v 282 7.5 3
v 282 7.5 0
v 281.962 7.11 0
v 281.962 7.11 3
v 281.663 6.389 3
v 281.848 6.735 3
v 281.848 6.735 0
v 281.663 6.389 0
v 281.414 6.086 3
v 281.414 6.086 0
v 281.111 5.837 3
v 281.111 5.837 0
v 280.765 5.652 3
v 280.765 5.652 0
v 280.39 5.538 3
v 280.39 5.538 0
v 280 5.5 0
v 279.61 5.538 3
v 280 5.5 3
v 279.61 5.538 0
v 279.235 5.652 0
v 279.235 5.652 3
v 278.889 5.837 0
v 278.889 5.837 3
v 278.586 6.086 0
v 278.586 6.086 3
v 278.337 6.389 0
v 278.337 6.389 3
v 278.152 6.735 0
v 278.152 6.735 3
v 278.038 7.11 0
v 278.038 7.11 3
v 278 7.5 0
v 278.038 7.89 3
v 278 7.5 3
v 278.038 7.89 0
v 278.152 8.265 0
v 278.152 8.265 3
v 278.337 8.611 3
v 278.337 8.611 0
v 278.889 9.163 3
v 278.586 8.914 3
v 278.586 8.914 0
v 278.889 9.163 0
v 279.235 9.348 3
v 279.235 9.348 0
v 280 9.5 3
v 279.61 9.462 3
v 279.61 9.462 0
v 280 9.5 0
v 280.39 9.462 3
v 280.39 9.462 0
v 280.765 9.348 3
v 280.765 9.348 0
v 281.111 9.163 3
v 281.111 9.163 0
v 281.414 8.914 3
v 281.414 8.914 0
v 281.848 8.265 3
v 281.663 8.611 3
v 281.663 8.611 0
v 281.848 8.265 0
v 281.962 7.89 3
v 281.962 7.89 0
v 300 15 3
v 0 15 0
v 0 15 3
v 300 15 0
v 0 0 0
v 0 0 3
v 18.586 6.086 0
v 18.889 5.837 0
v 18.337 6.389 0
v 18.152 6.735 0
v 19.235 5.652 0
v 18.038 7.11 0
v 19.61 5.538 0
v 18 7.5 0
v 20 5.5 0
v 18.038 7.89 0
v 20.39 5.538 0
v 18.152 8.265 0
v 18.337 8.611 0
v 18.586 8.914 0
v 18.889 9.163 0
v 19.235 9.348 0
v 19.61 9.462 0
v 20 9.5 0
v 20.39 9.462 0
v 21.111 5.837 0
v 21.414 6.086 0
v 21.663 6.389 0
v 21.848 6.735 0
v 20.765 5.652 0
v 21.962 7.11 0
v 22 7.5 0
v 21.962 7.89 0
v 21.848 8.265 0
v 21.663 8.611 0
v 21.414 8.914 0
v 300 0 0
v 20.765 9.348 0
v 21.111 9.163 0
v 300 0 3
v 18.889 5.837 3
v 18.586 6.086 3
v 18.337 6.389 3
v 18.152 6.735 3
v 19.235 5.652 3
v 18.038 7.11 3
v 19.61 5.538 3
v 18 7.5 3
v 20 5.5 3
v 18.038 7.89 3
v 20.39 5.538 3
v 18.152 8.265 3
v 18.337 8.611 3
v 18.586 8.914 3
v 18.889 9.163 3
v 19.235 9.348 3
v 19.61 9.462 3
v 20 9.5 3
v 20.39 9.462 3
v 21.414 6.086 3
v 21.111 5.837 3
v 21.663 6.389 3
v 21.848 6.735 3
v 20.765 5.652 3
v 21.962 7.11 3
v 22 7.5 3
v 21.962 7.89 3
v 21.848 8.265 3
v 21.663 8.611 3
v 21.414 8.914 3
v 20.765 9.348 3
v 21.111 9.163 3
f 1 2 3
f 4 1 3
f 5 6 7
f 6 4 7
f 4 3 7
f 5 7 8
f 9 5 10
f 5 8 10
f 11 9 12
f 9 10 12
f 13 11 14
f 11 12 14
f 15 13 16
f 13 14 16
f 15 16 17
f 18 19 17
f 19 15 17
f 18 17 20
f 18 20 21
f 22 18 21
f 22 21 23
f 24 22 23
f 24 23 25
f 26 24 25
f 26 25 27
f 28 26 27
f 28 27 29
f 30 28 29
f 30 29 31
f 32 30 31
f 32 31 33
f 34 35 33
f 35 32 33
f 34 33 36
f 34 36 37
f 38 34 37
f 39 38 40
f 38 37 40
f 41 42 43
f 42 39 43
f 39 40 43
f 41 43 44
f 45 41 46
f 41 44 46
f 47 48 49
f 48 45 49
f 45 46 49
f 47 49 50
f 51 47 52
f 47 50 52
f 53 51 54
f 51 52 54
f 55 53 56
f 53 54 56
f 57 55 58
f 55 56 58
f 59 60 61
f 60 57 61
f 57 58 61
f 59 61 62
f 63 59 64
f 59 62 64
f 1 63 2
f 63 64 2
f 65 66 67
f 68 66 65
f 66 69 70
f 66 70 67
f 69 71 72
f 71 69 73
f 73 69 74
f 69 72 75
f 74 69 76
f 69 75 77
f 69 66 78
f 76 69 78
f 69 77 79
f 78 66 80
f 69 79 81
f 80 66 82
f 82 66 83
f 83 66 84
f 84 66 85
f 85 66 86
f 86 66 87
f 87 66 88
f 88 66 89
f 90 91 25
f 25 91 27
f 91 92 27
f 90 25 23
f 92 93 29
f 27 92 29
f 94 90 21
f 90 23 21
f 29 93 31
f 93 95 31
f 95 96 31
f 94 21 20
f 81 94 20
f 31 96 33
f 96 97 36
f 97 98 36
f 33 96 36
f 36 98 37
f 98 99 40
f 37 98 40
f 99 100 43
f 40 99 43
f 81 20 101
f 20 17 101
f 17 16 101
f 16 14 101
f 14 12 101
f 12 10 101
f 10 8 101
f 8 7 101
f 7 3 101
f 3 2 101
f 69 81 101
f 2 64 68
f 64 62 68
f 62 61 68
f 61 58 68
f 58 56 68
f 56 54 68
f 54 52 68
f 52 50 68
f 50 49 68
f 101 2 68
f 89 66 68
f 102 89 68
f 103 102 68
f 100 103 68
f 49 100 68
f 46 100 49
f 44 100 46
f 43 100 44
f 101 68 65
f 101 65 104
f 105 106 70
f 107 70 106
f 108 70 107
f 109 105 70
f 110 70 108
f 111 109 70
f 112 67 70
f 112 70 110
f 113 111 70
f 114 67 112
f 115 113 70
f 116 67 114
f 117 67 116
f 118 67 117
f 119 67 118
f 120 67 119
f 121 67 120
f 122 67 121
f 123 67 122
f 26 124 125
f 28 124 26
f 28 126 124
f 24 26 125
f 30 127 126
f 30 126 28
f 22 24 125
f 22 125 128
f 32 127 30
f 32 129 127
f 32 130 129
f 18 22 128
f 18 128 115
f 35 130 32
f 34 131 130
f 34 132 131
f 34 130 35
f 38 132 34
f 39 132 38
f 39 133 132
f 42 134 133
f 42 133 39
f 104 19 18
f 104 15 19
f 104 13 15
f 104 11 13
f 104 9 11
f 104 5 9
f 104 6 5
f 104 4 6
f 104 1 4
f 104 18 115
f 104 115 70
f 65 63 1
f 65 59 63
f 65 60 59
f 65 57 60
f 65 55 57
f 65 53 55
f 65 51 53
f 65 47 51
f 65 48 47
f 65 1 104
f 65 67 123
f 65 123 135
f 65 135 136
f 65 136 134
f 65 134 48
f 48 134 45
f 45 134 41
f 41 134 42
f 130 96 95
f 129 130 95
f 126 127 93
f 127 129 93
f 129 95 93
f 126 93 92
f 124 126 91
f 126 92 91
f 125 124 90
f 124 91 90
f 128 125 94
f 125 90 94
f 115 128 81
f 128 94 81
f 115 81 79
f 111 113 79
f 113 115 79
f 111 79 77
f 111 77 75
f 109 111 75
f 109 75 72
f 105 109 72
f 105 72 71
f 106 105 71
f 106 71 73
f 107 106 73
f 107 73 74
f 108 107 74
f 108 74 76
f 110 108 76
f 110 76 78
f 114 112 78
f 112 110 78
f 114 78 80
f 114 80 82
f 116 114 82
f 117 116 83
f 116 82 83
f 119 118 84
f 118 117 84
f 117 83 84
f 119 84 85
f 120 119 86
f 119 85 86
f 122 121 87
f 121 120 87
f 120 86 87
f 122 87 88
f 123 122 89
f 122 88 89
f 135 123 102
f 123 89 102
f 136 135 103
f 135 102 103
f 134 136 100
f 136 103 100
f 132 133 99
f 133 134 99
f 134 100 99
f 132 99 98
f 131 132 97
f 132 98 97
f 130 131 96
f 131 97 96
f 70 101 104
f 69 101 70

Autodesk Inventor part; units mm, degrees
ref_plane "YZ Plane" through (0, 0, 0) normal (1, 0, 0) x (0, 1, 0)
ref_plane "XZ Plane" through (0, 0, 0) normal (0, 1, 0) x (-1, 0, 0)
ref_plane "XY Plane" through (0, 0, 0) normal (0, 0, 1) x (1, 0, 0)
sketch "草圖1" plane through (0, 0, 0) normal (0, 0, 1) x (1, 0, 0)
  line L0 (0, 15) -> (300, 15)
  line L1 (300, 15) -> (300, 0)
  line L2 (300, 0) -> (0, 0)
  line L3 (0, 0) -> (0, 15)
  circle A0 centre (20, 7.5) radius 2
  circle A1 centre (280, 7.5) radius 2
  dimension "d0" = 300
  dimension "d1" = 15
  dimension "d2" = 7.5
  dimension "d3" = 4
  dimension "d4" = 20
  dimension "d5" = 20
  dimension "d6" = 7.5
  dimension "d7" = 4
extrude "擠出1" add sketch "草圖1" along normal blind 3
